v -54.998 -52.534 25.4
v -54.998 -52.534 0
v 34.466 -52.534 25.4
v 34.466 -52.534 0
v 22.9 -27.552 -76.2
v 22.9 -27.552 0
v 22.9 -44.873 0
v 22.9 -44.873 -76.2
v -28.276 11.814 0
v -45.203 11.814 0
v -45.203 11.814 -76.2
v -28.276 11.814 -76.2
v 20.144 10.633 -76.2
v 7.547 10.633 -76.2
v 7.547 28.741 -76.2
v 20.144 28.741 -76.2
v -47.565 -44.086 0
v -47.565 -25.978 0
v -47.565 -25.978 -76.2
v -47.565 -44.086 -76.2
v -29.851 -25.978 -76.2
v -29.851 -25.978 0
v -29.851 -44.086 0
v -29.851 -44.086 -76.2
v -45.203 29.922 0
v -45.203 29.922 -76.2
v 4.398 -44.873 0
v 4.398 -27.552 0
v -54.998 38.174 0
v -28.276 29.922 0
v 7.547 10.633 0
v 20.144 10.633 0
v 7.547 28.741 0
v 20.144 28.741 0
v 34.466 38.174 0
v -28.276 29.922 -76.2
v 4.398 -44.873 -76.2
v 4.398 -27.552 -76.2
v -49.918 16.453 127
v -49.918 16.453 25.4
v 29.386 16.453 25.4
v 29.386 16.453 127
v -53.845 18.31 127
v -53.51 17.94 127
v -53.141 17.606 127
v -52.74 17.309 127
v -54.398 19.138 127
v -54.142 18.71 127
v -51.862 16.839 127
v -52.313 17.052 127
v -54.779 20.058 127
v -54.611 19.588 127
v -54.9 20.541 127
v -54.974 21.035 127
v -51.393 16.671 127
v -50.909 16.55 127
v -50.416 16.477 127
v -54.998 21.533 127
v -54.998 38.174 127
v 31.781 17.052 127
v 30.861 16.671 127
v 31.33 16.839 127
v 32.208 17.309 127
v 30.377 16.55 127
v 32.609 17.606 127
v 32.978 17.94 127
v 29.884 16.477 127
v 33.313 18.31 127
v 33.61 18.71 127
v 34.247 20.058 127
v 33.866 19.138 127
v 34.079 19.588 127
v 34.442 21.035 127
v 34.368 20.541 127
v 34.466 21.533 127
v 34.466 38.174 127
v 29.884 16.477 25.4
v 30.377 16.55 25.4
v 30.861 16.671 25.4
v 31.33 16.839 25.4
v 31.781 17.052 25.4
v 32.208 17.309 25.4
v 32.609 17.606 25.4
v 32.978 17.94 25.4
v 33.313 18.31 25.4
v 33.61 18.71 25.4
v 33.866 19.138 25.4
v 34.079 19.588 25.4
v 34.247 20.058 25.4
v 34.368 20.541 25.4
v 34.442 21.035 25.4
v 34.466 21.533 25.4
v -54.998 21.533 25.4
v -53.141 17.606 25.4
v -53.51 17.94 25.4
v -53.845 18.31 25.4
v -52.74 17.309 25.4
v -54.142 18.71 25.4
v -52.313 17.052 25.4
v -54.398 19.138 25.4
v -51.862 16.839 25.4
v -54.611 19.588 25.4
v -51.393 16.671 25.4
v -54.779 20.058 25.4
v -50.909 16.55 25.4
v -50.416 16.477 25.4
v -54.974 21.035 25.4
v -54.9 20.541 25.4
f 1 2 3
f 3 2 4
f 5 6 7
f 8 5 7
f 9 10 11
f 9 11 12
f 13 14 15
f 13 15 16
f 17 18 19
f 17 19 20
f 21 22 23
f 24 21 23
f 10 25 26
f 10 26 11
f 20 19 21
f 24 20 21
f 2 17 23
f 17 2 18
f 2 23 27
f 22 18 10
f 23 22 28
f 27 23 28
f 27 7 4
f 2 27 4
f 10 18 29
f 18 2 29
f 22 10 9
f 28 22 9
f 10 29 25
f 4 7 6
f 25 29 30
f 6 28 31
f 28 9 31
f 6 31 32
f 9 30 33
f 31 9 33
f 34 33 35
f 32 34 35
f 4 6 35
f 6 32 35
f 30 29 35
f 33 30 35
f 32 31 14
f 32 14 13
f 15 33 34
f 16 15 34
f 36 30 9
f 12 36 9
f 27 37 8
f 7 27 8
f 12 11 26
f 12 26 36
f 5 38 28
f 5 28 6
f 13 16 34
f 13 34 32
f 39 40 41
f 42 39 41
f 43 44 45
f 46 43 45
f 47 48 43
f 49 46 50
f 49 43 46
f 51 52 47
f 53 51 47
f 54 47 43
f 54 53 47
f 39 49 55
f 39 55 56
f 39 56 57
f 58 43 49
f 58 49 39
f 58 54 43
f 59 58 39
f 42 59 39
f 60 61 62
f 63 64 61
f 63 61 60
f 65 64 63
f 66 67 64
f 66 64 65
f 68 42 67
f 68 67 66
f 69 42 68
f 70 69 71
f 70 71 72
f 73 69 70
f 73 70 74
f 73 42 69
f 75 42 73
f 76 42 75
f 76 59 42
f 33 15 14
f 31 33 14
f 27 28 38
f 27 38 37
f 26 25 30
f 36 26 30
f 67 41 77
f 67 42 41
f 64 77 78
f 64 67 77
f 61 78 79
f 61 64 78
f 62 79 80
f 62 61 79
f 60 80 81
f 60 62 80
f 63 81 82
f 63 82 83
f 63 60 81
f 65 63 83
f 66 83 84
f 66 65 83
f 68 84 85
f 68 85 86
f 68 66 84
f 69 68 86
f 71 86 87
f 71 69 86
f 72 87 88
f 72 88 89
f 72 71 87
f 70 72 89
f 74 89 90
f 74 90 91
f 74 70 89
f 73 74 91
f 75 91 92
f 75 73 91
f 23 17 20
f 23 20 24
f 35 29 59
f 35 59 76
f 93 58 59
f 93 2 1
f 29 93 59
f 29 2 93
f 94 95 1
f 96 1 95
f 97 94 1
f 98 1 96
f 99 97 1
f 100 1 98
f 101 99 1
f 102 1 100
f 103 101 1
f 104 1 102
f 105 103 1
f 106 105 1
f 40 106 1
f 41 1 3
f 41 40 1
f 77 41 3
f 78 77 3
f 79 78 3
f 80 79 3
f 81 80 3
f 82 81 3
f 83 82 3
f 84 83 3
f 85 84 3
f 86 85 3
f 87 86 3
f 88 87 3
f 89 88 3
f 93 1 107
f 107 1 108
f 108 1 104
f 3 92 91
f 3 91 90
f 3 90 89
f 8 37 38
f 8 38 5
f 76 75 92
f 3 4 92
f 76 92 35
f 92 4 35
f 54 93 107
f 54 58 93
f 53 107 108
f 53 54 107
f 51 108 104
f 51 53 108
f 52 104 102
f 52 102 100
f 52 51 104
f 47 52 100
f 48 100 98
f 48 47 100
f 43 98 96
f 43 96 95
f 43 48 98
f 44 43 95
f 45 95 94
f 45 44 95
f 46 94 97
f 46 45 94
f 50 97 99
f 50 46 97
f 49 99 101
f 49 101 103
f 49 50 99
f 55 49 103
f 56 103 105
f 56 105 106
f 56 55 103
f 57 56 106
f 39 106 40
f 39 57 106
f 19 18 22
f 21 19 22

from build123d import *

# Parameters (mm, degrees)
F0_W     = 89.4640423357
F0_H     = 90.7079130411
F1_DEPTH = 25.4
F2_W     = 89.4640423357
F2_H     = 21.721240133
F3_DEPTH = 101.6
F4_W     = 17.7147258073
F4_H     = 18.108388409
F4_W_2   = 18.5020421632
F4_H_2   = 17.3210632056
F4_W_3   = 12.5971408561
F4_H_3   = 18.1083856151
F4_W_4   = 16.9274024665
F5_DEPTH = 76.2
F6_R     = 5.08


with BuildPart() as f1:
    # F0 (on Top) → F1 (new body)
    with BuildSketch(Plane.XY):
        with Locations((-10.2659445256, -7.1802102029)):
            Rectangle(F0_W, F0_H)
    extrude(amount=F1_DEPTH)

    # F2 (on face) → F3 (join)
    with BuildSketch(Plane.XY.offset(25.4)):
        with Locations((-10.2659445256, 27.3131262511)):
            Rectangle(F2_W, F2_H)
    extrude(amount=F3_DEPTH)

    # F4 (on face) → F5 (join)
    with BuildSketch(Plane(origin=(0, 0, 0), x_dir=(1, 0, 0), z_dir=(0, 0, -1))):
        with Locations((-38.7079184875, 35.0316995755)):
            Rectangle(F4_W, F4_H)
        with Locations((13.6489381548, 36.21267993)):
            Rectangle(F4_W_2, F4_H_2)
        with Locations((13.8457692228, -19.687120337)):
            Rectangle(F4_W_3, F4_H_3)
        with Locations((-36.7396157235, -20.8681025542)):
            Rectangle(F4_W_4, F4_H_3)
    extrude(amount=F5_DEPTH)

    # F6
    f6_edges = [f1.edges().sort_by_distance(p)[0] for p in [
        (34.466077, 16.452506, 76.2),
        (-54.997966, 16.452506, 76.2),
    ]]
    fillet(f6_edges, radius=F6_R)


solid = f1.part
